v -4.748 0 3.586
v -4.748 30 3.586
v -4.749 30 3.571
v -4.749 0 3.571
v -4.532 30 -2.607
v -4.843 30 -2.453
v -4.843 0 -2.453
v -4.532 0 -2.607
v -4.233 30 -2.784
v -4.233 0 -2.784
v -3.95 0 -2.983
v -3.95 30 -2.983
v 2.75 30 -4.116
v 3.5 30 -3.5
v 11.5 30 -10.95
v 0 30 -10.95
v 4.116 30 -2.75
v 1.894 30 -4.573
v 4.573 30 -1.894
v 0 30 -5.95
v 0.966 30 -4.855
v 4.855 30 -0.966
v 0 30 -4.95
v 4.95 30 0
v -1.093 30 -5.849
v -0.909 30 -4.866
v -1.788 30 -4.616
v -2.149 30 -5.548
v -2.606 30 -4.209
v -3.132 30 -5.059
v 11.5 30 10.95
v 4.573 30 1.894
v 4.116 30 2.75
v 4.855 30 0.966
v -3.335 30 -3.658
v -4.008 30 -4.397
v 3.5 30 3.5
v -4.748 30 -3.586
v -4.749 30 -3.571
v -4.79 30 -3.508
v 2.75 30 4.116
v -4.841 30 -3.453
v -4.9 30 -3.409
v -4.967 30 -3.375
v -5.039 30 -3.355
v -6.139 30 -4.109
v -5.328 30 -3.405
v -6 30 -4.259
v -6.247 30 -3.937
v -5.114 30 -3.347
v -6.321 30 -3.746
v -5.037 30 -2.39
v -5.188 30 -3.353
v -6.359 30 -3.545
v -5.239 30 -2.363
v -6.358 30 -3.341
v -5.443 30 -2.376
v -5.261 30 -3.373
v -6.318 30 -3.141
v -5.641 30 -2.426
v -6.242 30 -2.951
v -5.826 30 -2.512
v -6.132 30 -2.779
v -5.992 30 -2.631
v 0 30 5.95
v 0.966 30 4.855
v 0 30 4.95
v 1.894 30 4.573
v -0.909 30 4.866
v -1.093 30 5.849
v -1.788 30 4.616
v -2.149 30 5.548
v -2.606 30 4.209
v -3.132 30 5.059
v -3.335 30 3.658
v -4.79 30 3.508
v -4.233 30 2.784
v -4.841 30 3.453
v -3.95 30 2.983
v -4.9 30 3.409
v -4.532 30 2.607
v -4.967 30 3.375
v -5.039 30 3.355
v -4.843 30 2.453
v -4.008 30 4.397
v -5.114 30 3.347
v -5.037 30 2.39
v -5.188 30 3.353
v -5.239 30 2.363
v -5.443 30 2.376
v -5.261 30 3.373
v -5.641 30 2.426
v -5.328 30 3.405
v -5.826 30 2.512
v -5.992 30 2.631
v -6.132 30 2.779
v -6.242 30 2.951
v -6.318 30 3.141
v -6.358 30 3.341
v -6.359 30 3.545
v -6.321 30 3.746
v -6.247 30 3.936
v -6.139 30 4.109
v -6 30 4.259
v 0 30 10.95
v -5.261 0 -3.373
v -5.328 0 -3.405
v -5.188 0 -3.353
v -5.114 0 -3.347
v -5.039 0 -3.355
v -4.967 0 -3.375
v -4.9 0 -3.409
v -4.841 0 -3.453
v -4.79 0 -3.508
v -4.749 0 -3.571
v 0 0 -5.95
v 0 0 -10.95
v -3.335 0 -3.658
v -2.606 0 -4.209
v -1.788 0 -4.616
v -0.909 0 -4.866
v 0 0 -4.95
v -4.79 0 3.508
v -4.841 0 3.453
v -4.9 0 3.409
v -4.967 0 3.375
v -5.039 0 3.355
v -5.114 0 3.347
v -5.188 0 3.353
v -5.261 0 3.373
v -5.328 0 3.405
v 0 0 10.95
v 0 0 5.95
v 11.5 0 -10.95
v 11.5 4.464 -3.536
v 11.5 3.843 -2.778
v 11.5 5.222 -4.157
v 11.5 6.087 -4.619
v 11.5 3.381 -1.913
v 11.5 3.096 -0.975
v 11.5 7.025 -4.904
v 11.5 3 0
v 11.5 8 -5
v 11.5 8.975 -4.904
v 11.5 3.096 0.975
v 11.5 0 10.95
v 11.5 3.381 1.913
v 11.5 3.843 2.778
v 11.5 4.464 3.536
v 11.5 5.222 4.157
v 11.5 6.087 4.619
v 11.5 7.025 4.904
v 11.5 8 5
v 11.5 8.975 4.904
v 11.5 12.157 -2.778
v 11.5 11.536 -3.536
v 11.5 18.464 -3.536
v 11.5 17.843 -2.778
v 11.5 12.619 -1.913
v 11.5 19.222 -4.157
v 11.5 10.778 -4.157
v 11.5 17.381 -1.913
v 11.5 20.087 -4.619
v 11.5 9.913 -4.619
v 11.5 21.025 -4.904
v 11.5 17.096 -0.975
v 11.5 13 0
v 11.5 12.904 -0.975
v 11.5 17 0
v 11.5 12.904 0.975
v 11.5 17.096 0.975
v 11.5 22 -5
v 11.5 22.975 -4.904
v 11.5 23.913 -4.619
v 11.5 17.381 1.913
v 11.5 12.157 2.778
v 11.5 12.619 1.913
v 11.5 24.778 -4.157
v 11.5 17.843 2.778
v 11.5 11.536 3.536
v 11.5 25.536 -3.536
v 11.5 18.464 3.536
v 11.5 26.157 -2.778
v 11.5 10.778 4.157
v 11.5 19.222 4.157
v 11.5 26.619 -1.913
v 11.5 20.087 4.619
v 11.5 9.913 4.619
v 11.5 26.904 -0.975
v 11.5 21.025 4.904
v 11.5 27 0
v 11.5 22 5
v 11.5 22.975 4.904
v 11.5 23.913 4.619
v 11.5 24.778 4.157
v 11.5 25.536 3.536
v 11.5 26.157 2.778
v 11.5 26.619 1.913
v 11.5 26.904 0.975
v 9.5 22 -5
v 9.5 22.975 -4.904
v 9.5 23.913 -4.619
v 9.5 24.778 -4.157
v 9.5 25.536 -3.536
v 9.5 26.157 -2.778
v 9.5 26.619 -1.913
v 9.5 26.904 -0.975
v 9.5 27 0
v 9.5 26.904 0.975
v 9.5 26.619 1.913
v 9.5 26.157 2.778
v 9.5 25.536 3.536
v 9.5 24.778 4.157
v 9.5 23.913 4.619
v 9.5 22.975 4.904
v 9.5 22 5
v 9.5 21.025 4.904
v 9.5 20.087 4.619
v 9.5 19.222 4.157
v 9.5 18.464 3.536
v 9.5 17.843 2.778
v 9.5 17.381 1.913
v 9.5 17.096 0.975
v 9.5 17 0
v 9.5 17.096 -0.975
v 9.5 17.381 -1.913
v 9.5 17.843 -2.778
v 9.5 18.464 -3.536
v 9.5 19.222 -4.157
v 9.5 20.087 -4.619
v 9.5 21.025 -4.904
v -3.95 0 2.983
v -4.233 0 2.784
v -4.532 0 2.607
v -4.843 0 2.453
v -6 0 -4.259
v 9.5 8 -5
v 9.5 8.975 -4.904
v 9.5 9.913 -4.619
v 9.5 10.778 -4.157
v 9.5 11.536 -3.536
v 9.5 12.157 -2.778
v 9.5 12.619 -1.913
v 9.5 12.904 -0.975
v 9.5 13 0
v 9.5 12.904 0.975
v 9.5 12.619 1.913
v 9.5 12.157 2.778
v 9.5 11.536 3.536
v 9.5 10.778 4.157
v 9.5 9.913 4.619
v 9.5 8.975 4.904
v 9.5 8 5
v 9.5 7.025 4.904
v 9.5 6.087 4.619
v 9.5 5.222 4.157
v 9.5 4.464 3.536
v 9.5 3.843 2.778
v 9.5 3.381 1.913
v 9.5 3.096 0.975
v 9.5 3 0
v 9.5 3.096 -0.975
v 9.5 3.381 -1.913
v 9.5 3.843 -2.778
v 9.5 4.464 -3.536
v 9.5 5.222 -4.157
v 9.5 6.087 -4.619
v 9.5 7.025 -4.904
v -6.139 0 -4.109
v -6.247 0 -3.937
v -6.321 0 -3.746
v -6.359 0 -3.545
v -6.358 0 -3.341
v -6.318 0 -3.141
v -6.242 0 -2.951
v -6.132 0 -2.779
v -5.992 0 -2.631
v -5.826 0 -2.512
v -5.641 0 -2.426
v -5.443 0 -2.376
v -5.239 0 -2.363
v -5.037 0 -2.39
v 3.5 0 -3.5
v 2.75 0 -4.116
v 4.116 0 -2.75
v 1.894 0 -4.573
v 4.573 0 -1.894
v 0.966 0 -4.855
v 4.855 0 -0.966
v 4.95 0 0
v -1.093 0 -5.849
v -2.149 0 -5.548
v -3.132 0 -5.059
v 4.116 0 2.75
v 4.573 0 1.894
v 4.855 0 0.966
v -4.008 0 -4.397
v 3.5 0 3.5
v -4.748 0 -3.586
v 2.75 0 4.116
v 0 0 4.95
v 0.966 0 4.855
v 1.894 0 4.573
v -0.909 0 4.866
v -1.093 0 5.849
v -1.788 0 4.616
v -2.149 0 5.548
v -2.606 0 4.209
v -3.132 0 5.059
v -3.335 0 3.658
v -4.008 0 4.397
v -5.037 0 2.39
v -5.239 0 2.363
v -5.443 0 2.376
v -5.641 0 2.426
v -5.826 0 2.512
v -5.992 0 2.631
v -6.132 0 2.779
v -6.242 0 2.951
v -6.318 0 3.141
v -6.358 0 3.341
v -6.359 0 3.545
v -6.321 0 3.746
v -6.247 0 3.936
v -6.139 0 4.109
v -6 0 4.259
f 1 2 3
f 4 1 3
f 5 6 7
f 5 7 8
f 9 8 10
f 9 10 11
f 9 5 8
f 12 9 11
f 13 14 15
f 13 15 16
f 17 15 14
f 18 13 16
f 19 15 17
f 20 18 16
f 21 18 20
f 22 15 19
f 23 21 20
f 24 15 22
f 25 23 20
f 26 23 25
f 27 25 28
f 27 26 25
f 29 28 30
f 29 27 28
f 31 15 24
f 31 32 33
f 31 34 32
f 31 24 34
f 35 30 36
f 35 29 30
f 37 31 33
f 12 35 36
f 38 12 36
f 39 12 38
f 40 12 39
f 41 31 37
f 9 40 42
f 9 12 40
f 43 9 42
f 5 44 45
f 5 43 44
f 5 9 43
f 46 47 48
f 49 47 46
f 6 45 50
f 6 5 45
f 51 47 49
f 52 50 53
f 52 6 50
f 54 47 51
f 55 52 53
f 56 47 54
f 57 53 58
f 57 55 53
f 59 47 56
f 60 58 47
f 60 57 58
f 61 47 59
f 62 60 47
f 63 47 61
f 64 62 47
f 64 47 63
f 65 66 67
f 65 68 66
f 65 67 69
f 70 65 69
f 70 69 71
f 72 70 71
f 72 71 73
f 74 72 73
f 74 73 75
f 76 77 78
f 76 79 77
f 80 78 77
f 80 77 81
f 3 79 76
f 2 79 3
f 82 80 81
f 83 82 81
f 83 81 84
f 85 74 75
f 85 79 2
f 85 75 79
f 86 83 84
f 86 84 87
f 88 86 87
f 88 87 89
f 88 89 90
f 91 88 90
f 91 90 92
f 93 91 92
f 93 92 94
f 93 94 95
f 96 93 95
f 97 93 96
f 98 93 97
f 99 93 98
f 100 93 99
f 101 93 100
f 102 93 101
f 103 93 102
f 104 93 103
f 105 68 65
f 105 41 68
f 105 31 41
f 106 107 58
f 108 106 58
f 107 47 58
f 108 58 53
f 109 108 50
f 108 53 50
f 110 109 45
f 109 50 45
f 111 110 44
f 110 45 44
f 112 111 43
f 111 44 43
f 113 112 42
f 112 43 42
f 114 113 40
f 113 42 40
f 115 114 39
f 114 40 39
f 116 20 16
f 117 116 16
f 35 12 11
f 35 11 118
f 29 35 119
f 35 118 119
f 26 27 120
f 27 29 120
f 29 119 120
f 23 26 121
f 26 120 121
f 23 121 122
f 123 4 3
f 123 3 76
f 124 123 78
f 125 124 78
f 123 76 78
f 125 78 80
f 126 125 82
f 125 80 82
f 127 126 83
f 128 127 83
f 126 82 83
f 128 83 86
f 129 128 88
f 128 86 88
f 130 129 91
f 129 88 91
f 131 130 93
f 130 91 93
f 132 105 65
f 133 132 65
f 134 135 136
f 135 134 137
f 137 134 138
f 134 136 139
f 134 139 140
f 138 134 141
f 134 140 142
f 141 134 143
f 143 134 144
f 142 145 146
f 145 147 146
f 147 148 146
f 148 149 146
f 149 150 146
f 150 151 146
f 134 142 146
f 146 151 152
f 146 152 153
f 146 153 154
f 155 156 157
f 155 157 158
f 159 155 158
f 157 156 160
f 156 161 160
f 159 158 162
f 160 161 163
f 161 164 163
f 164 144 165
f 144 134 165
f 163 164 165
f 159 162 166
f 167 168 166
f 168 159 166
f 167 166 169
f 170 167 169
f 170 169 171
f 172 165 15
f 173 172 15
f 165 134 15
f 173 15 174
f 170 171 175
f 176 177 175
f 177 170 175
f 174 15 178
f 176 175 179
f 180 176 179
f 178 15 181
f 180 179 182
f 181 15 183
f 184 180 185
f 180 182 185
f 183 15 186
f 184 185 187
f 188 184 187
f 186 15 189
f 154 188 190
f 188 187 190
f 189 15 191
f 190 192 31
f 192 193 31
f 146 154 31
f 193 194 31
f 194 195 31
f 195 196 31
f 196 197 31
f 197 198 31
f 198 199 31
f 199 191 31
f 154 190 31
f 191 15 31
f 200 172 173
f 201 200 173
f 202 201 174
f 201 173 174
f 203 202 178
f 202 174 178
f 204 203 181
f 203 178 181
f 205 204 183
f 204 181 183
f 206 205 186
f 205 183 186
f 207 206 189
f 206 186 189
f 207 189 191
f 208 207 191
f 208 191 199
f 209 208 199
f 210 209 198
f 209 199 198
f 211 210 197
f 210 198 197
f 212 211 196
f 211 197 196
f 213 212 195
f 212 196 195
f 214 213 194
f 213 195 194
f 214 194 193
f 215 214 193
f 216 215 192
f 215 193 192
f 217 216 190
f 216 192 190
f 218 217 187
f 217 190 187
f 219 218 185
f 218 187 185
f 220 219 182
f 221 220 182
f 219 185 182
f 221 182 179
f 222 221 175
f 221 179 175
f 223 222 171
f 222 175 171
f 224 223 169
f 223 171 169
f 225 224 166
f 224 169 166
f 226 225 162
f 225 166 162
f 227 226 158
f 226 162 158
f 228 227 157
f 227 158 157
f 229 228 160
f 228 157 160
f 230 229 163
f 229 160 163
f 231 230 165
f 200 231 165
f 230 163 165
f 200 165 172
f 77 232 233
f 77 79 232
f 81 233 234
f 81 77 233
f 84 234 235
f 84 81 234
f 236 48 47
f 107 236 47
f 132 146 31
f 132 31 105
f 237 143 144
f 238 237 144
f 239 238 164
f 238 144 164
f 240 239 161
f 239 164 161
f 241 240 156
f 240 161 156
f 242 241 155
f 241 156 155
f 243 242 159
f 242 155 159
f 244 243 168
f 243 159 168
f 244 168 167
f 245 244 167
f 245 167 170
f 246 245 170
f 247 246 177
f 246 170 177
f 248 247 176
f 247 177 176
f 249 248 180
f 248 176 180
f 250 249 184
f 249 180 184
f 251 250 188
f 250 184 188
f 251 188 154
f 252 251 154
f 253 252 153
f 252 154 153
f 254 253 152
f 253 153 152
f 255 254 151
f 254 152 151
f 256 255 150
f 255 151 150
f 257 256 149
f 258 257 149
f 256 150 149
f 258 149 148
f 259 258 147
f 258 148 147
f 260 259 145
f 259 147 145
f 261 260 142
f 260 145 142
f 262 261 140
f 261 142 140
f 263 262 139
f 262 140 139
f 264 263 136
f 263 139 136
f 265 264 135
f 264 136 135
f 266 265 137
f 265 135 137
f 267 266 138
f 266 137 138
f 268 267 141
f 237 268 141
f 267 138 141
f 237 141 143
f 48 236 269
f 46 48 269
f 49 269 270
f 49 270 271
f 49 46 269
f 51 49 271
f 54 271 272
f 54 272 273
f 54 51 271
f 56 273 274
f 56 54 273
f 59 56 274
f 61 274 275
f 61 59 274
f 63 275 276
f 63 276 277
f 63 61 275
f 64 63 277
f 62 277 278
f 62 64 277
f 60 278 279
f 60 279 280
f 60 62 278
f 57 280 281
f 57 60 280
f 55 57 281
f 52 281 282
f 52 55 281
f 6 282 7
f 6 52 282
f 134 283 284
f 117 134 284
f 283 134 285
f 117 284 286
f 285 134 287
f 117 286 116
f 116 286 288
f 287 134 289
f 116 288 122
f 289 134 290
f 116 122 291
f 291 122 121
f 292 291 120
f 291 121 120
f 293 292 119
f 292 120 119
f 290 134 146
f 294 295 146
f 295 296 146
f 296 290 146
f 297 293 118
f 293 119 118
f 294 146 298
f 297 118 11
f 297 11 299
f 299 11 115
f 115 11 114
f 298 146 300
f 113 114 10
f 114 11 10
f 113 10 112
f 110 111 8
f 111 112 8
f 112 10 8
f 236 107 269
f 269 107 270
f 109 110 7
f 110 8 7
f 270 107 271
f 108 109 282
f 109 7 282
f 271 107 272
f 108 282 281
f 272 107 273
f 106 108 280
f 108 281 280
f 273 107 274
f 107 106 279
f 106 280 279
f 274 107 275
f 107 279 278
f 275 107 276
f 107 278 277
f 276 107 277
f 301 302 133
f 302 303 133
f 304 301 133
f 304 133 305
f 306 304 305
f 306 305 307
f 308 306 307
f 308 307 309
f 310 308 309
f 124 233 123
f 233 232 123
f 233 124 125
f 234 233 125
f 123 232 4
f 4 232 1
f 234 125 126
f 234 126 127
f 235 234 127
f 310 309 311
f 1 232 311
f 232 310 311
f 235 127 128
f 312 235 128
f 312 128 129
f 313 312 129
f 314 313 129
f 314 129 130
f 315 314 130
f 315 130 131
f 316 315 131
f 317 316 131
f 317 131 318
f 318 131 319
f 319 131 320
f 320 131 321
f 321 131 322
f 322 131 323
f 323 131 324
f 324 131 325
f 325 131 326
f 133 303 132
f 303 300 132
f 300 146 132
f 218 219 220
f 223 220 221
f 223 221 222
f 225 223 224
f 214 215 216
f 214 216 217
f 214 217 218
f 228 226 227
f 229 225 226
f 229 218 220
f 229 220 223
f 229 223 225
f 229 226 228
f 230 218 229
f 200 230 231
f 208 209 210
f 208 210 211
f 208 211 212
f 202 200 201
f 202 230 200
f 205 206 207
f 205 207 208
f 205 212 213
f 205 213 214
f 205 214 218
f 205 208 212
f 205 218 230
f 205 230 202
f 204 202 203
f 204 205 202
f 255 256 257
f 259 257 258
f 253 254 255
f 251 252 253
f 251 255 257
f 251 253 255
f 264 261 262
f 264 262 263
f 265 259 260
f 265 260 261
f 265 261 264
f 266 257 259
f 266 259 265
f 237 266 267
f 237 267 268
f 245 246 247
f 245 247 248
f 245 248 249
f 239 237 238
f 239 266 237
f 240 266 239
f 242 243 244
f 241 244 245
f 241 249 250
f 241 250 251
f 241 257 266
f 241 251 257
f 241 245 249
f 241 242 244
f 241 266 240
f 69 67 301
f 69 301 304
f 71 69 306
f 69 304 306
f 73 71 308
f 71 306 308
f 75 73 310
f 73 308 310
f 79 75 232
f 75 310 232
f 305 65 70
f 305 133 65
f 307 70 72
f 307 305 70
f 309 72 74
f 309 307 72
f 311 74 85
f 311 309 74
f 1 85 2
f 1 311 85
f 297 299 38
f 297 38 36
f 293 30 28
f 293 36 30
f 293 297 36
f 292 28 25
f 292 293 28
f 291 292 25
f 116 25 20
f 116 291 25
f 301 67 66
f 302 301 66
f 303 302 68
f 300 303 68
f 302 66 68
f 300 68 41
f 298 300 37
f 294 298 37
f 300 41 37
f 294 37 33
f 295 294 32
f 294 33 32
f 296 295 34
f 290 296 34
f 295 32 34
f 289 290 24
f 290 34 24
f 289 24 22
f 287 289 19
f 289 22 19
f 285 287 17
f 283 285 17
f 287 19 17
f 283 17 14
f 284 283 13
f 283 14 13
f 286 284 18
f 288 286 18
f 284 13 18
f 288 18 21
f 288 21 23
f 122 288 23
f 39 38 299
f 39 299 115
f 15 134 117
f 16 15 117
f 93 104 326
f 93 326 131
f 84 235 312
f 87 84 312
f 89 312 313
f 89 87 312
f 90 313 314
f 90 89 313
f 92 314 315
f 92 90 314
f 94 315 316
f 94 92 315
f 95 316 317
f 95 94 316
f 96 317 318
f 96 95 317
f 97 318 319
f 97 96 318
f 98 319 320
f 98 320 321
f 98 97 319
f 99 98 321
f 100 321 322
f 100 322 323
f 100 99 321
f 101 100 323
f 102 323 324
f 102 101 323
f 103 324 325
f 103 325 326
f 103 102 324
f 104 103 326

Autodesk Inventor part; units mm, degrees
ref_plane "YZ Plane" through (0, 0, 0) normal (1, 0, 0) x (0, 1, 0)
ref_plane "XZ Plane" through (0, 0, 0) normal (0, 1, 0) x (-1, 0, 0)
ref_plane "XY Plane" through (0, 0, 0) normal (0, 0, 1) x (1, 0, 0)
sketch "Эскиз1" plane through (0, 0, 0) normal (0, 1, 0) x (-1, 0, 0)
  circle A0 centre (0, 0) radius 4.95
  circle A1 centre (0, 0) radius 5.95
  line L0 (0, 0) -> (4.748, 3.586)
  line L1 (0, 0) -> (4.748, -3.586)
  point P0 (3.95, -2.9833)
  point P1 (3.95, 2.9833)
  dimension "d0" = 9.9
  dimension "d1" = 11.9
extrude "Выдавливание1" add sketch "Эскиз1" along normal blind 30 contours A0 L1 A1 L0 picked at (4.1379, 3.7388)
sketch "Эскиз2" plane through (0, 30, 0) normal (0, 1, 0) x (1, 0, 0)
  arc A0 (-3.95, -2.9833) -> (-4.8427, -2.4534) centre (-6.6513, -6.5172) ccw
  arc A1 (-4.8427, -2.4534) -> (-5.9996, -4.2591) centre (-5.277, -3.4486) ccw
  line L0 (-5.9996, -4.2591) -> (-5.3283, -3.4047)
  arc A2 (-4.7494, -3.5714) -> (-5.3283, -3.4047) centre (-5.1177, -3.7619) ccw
  line L1 (-3.95, -2.9833) -> (-4.748, -3.586)
  line L2 (-4.748, -3.586) -> (-3.95, -2.9833)
  line L3 (-4.748, -3.586) -> (-4.7494, -3.5714)
  line L4 (-0.0151, 0) -> (-3.489, 0)
  arc A3 (-4.8427, 2.4534) -> (-3.95, 2.9833) centre (-6.6513, 6.5172) ccw
  arc A4 (-5.3283, 3.4047) -> (-4.7494, 3.5714) centre (-5.1177, 3.7619) ccw
  line L5 (-3.95, 2.9833) -> (-4.748, 3.586)
  line L6 (-4.748, 3.586) -> (-3.95, 2.9833)
  line L7 (-4.748, 3.586) -> (-4.7494, 3.5714)
  arc A5 (-5.9996, 4.2591) -> (-4.8427, 2.4534) centre (-5.277, 3.4486) ccw
  line L8 (-5.9996, 4.2591) -> (-5.3283, 3.4047)
  point P0 (-3.95, 2.9833)
  point P1 (-4.748, -3.586)
  point P2 (-5.3694, -4.0591)
  point P3 (-4.748, 3.586)
  point P4 (-5.3694, 4.0591)
  point P5 (-4.748, 3.586)
  dimension "d25" = 1.0859
sketch "Эскиз3" plane through (0, 30, 0) normal (0, 1, 0) x (1, 0, 0)
  arc A0 (-4.748, -3.586) -> (-4.748, 3.586) centre (0, 0) ccw projected
  line L0 (11.5, -6.95) -> (11.5, 6.95)
  arc A1 (-3.95, -2.9833) -> (-3.95, 2.9833) centre (0, 0) ccw projected
  line L1 (0, -5.95) -> (0, -4.95)
  line L2 (0, 4.95) -> (0, 5.95)
  line L3 (11.5, 6.95) -> (11.5, 10.95)
  line L4 (11.5, -6.95) -> (11.5, -10.95)
  line L5 (0, 1.45) -> (0, 5.95)
  line L6 (11.5, -10.95) -> (0, -10.95)
  line L7 (0, -10.95) -> (0, -5.95)
  line L8 (11.5, 10.95) -> (0, 10.95)
  line L9 (0, 10.95) -> (0, 5.95)
  arc A2 (0, -4.95) -> (0, 4.95) centre (0, 0) ccw
  dimension "d13" = 4
  dimension "d14" = 4
  dimension "d22" = 21.9
  dimension "d23" = 6
extrude "Выдавливание3" add sketch "Эскиз3" against normal blind 30
ref_plane "РабПлоскость1" through (11.5, 20, 4.95) normal (1, 0, 0) x (0, 0, -1)
sketch "Эскиз4" plane through (11.5, 20, 4.95) normal (1, 0, 0) x (0, 0, -1)
  line L0 (4.95, -20) -> (4.95, 10)
  line L1 (1, 10) -> (8.9, 10) projected
  circle A0 centre (4.95, -12) radius 5
  line L2 (14.4, -20) -> (-4.5, -20) projected
  circle A1 centre (4.95, 2) radius 5
  line L3 (-4.5, 10) -> (14.4, 10) projected
  point P0 (7.3306, 10)
  point P1 (2.5694, 10)
  point P2 (4.95, 10)
  dimension "d15" = 10
  dimension "d16" = 8
  dimension "d17" = 10
  dimension "d18" = 8
extrude "Выдавливание4" cut sketch "Эскиз4" against normal blind 2
extrude "Выдавливание5" add sketch "Эскиз2" against normal blind 30
sketch "Эскиз5" plane through (0, 30, 0) normal (0, 1, 0) x (1, 0, 0)
  arc A0 (0, 5.95) -> (-4.748, 3.586) centre (0, 0) ccw projected
  line L0 (-4.748, 3.586) -> (-4.7494, 3.5714) projected
  arc A1 (-5.3283, 3.4047) -> (-4.7494, 3.5714) centre (-5.1177, 3.7619) ccw projected
  line L1 (-5.3283, 3.4047) -> (-5.9996, 4.2591) projected
  arc A2 (-5.9996, 4.2591) -> (-4.8427, 2.4534) centre (-5.277, 3.4486) ccw projected
  arc A3 (-4.8427, 2.4534) -> (-3.95, 2.9833) centre (-6.6513, 6.5172) ccw projected
  arc A4 (-3.95, -2.9833) -> (-3.95, 2.9833) centre (0, 0) ccw projected
  arc A5 (-3.95, -2.9833) -> (-4.8427, -2.4534) centre (-6.6513, -6.5172) ccw projected
  arc A6 (-4.8427, -2.4534) -> (-5.9996, -4.2591) centre (-5.277, -3.4486) ccw projected
  line L2 (-5.9996, -4.2591) -> (-5.3283, -3.4047) projected
  arc A7 (-4.7494, -3.5714) -> (-5.3283, -3.4047) centre (-5.1177, -3.7619) ccw projected
  line L3 (-4.7494, -3.5714) -> (-4.748, -3.586) projected
  arc A8 (-4.748, -3.586) -> (0, -5.95) centre (0, 0) ccw projected
  line L4 (0, -5.95) -> (0, -10.95) projected
  line L5 (0, -10.95) -> (11.5, -10.95) projected
  line L6 (11.5, -10.95) -> (11.5, 10.95) projected
  line L7 (11.5, 10.95) -> (0, 10.95) projected
  line L8 (0, 10.95) -> (0, 5.95) projected
  line L9 (0, 4.95) -> (0, 5.95)
  line L10 (0, -4.95) -> (0, -5.95)
extrude "Выдавливание6" [suppressed]
sketch "Эскиз6" plane through (11.5, 30, 10.95) normal (1, 0, 0) x (0, 0, -1)
  arc A0 (15.95, -22) -> (15.95, -22) centre (10.95, -22) ccw projected
  arc A1 (15.95, -8) -> (15.95, -8) centre (10.95, -8) ccw projected
  point P0 (10.95, -30)
extrude "Выдавливание7" [suppressed]
sketch "Эскиз7" plane through (11.5, 30, 10.95) normal (1, 0, 0) x (0, 0, -1)
  circle A0 centre (10.95, -8) radius 5 projected
  circle A1 centre (10.95, -22) radius 5 projected
  line L0 (0, 0) -> (21.9, 0) projected
  line L1 (0, 0) -> (0, -30) projected
  line L2 (21.9, -30) -> (0, -30) projected
  line L3 (21.9, 0) -> (21.9, -30) projected
  point P0 (10.95, -30)
properties part number "крепление маркера 10мм"
